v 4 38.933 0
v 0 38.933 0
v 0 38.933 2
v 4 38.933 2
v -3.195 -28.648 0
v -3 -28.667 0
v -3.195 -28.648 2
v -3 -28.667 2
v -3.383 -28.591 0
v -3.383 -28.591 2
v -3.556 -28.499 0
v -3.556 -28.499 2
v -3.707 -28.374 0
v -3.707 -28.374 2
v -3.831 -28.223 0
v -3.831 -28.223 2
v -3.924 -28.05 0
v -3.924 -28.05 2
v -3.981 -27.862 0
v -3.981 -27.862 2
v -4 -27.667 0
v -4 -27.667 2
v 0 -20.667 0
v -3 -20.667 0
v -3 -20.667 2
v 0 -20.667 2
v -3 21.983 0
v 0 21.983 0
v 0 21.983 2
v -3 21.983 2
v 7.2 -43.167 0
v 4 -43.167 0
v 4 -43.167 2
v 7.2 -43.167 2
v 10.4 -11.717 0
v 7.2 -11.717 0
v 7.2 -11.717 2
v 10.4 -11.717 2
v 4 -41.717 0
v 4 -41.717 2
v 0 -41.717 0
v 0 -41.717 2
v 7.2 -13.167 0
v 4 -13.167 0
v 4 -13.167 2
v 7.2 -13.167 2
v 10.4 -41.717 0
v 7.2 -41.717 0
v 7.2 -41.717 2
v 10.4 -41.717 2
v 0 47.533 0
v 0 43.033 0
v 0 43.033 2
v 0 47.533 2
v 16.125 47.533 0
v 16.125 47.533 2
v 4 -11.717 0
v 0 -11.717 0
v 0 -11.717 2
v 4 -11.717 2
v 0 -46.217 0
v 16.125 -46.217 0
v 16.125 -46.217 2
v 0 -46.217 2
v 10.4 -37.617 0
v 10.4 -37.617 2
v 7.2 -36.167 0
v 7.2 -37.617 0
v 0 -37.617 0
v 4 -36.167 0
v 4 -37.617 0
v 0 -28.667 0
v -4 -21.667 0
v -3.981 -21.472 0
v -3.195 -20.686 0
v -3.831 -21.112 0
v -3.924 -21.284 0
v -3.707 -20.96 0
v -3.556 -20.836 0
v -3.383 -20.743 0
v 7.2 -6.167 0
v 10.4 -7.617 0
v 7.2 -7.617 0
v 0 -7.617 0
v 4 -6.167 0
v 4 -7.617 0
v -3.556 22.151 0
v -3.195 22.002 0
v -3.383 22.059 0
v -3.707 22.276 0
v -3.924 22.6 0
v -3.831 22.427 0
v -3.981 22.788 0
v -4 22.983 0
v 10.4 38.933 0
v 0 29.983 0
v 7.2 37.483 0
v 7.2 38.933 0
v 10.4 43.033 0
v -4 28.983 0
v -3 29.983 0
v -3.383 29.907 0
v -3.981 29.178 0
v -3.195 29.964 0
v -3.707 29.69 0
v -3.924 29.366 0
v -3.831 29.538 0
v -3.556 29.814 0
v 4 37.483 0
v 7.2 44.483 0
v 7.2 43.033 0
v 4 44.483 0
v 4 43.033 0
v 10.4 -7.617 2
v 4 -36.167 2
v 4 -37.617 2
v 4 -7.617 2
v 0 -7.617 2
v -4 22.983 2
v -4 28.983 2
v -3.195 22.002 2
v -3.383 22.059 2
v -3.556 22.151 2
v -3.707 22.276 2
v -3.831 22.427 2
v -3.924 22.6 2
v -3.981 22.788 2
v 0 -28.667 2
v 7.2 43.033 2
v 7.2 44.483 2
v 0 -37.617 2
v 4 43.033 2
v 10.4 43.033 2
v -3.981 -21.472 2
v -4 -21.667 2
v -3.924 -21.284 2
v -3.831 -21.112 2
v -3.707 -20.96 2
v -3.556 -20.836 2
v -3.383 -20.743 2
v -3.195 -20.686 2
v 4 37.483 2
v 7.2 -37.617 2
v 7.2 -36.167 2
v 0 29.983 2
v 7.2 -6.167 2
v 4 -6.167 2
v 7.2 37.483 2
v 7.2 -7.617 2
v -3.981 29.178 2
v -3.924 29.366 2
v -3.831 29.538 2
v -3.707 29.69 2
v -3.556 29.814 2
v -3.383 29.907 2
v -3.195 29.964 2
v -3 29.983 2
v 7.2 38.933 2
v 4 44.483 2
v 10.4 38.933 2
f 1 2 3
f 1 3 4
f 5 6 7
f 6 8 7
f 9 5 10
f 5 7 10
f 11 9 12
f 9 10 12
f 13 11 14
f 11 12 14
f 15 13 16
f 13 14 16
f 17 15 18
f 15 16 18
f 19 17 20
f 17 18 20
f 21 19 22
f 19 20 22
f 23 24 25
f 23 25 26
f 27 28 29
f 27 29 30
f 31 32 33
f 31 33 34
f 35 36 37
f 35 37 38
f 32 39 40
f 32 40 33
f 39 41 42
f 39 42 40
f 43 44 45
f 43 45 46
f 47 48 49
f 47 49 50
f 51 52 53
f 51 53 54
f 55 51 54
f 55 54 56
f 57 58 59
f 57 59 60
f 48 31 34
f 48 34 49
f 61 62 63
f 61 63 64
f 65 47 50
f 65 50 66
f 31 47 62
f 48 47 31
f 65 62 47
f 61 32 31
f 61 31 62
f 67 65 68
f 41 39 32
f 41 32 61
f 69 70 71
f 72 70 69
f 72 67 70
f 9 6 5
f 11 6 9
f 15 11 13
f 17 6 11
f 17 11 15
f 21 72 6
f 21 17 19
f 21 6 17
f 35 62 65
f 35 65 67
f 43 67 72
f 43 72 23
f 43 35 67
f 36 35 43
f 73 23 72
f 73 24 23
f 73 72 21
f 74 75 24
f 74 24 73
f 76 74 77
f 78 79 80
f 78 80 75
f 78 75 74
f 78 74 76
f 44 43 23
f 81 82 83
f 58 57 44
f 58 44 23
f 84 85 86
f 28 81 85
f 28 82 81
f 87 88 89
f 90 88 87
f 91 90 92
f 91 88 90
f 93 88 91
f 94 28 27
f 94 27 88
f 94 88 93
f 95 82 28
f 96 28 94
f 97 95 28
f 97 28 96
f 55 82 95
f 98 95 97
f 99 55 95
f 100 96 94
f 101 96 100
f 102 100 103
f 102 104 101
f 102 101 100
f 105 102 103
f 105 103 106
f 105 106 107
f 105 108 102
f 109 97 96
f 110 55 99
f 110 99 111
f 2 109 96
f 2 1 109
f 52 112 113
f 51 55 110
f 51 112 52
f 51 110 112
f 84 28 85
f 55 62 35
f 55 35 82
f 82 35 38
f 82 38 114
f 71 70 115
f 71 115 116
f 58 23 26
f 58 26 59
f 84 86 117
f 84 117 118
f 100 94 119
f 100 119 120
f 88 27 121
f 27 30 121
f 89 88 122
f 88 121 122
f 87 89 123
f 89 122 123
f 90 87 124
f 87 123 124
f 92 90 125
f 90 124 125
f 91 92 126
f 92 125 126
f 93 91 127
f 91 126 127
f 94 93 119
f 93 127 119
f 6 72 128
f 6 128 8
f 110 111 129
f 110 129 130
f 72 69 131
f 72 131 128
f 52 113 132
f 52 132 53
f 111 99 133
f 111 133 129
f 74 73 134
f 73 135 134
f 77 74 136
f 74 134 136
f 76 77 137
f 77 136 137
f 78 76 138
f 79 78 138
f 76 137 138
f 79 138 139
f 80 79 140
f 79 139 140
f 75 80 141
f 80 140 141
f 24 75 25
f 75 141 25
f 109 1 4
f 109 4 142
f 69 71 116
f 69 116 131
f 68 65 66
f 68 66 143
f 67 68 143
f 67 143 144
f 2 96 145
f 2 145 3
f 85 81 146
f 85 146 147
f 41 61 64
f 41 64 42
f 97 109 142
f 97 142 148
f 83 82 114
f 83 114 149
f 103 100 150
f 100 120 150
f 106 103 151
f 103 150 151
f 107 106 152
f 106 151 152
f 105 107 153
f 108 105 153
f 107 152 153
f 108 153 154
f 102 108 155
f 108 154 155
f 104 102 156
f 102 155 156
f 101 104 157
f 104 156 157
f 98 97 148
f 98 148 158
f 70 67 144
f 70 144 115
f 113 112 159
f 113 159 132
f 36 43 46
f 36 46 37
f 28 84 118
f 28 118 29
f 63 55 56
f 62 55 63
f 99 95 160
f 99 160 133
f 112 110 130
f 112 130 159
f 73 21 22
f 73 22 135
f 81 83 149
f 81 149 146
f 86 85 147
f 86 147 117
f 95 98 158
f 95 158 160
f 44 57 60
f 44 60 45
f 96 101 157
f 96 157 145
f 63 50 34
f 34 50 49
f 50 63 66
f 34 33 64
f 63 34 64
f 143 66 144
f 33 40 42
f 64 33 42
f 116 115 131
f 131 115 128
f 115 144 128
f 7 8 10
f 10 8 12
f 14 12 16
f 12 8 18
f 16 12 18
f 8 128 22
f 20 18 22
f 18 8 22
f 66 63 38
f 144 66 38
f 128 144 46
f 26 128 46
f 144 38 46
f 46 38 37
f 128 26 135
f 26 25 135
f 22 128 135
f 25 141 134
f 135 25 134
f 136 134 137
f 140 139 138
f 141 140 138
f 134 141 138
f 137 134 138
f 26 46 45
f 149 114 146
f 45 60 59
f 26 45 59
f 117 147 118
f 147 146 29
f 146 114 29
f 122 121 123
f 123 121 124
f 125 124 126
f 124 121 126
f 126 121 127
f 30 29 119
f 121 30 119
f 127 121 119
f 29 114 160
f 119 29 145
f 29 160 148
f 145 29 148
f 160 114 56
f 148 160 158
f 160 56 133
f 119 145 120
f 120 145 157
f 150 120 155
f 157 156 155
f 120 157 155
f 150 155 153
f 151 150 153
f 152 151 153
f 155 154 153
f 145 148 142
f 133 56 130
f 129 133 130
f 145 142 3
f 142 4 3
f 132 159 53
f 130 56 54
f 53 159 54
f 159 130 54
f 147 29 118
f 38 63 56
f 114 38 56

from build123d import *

# Parameters (mm, degrees)
EXTRUDE_1_DEPTH = 2
FILLET_1_R      = 1


with BuildPart() as part:
    # 草图1 → 凸台-拉伸1 (new body)
    with BuildSketch(Plane.XY):
        Polygon((0, 38.932825237), (4, 38.932825237), (4, 37.482825237), (7.2, 37.482825237), (7.2, 38.932825237), (10.4, 38.932825237), (10.4, 43.032825237), (7.2, 43.032825237), (7.2, 44.482825237), (4, 44.482825237), (4, 43.032825237), (0, 43.032825237), (0, 47.532825237), (16.125183107, 47.532825237), (16.125183107, -46.217174763), (0, -46.217174763), (0, -41.717174763), (4, -41.717174763), (4, -43.167174763), (7.2, -43.167174763), (7.2, -41.717174763), (10.4, -41.717174763), (10.4, -37.617174763), (7.2, -37.617174763), (7.2, -36.167174763), (4, -36.167174763), (4, -37.617174763), (0, -37.617174763), (0, -28.667174763), (-4, -28.667174763), (-4, -20.667174763), (0, -20.667174763), (0, -11.717174763), (4, -11.717174763), (4, -13.167174763), (7.2, -13.167174763), (7.2, -11.717174763), (10.4, -11.717174763), (10.4, -7.617174763), (7.2, -7.617174763), (7.2, -6.167174763), (4, -6.167174763), (4, -7.617174763), (0, -7.617174763), (0, 21.982825237), (-4, 21.982825237), (-4, 29.982825237), (0, 29.982825237), align=None)
    extrude(amount=EXTRUDE_1_DEPTH)

    # 圆角1
    fillet_1_edges = [part.edges().sort_by_distance(p)[0] for p in [
        (-4, 29.982825237, 1),
        (-4, 21.982825237, 1),
        (-4, -20.667174763, 1),
        (-4, -28.667174763, 1),
    ]]
    fillet(fillet_1_edges, radius=FILLET_1_R)


solid = part.part
